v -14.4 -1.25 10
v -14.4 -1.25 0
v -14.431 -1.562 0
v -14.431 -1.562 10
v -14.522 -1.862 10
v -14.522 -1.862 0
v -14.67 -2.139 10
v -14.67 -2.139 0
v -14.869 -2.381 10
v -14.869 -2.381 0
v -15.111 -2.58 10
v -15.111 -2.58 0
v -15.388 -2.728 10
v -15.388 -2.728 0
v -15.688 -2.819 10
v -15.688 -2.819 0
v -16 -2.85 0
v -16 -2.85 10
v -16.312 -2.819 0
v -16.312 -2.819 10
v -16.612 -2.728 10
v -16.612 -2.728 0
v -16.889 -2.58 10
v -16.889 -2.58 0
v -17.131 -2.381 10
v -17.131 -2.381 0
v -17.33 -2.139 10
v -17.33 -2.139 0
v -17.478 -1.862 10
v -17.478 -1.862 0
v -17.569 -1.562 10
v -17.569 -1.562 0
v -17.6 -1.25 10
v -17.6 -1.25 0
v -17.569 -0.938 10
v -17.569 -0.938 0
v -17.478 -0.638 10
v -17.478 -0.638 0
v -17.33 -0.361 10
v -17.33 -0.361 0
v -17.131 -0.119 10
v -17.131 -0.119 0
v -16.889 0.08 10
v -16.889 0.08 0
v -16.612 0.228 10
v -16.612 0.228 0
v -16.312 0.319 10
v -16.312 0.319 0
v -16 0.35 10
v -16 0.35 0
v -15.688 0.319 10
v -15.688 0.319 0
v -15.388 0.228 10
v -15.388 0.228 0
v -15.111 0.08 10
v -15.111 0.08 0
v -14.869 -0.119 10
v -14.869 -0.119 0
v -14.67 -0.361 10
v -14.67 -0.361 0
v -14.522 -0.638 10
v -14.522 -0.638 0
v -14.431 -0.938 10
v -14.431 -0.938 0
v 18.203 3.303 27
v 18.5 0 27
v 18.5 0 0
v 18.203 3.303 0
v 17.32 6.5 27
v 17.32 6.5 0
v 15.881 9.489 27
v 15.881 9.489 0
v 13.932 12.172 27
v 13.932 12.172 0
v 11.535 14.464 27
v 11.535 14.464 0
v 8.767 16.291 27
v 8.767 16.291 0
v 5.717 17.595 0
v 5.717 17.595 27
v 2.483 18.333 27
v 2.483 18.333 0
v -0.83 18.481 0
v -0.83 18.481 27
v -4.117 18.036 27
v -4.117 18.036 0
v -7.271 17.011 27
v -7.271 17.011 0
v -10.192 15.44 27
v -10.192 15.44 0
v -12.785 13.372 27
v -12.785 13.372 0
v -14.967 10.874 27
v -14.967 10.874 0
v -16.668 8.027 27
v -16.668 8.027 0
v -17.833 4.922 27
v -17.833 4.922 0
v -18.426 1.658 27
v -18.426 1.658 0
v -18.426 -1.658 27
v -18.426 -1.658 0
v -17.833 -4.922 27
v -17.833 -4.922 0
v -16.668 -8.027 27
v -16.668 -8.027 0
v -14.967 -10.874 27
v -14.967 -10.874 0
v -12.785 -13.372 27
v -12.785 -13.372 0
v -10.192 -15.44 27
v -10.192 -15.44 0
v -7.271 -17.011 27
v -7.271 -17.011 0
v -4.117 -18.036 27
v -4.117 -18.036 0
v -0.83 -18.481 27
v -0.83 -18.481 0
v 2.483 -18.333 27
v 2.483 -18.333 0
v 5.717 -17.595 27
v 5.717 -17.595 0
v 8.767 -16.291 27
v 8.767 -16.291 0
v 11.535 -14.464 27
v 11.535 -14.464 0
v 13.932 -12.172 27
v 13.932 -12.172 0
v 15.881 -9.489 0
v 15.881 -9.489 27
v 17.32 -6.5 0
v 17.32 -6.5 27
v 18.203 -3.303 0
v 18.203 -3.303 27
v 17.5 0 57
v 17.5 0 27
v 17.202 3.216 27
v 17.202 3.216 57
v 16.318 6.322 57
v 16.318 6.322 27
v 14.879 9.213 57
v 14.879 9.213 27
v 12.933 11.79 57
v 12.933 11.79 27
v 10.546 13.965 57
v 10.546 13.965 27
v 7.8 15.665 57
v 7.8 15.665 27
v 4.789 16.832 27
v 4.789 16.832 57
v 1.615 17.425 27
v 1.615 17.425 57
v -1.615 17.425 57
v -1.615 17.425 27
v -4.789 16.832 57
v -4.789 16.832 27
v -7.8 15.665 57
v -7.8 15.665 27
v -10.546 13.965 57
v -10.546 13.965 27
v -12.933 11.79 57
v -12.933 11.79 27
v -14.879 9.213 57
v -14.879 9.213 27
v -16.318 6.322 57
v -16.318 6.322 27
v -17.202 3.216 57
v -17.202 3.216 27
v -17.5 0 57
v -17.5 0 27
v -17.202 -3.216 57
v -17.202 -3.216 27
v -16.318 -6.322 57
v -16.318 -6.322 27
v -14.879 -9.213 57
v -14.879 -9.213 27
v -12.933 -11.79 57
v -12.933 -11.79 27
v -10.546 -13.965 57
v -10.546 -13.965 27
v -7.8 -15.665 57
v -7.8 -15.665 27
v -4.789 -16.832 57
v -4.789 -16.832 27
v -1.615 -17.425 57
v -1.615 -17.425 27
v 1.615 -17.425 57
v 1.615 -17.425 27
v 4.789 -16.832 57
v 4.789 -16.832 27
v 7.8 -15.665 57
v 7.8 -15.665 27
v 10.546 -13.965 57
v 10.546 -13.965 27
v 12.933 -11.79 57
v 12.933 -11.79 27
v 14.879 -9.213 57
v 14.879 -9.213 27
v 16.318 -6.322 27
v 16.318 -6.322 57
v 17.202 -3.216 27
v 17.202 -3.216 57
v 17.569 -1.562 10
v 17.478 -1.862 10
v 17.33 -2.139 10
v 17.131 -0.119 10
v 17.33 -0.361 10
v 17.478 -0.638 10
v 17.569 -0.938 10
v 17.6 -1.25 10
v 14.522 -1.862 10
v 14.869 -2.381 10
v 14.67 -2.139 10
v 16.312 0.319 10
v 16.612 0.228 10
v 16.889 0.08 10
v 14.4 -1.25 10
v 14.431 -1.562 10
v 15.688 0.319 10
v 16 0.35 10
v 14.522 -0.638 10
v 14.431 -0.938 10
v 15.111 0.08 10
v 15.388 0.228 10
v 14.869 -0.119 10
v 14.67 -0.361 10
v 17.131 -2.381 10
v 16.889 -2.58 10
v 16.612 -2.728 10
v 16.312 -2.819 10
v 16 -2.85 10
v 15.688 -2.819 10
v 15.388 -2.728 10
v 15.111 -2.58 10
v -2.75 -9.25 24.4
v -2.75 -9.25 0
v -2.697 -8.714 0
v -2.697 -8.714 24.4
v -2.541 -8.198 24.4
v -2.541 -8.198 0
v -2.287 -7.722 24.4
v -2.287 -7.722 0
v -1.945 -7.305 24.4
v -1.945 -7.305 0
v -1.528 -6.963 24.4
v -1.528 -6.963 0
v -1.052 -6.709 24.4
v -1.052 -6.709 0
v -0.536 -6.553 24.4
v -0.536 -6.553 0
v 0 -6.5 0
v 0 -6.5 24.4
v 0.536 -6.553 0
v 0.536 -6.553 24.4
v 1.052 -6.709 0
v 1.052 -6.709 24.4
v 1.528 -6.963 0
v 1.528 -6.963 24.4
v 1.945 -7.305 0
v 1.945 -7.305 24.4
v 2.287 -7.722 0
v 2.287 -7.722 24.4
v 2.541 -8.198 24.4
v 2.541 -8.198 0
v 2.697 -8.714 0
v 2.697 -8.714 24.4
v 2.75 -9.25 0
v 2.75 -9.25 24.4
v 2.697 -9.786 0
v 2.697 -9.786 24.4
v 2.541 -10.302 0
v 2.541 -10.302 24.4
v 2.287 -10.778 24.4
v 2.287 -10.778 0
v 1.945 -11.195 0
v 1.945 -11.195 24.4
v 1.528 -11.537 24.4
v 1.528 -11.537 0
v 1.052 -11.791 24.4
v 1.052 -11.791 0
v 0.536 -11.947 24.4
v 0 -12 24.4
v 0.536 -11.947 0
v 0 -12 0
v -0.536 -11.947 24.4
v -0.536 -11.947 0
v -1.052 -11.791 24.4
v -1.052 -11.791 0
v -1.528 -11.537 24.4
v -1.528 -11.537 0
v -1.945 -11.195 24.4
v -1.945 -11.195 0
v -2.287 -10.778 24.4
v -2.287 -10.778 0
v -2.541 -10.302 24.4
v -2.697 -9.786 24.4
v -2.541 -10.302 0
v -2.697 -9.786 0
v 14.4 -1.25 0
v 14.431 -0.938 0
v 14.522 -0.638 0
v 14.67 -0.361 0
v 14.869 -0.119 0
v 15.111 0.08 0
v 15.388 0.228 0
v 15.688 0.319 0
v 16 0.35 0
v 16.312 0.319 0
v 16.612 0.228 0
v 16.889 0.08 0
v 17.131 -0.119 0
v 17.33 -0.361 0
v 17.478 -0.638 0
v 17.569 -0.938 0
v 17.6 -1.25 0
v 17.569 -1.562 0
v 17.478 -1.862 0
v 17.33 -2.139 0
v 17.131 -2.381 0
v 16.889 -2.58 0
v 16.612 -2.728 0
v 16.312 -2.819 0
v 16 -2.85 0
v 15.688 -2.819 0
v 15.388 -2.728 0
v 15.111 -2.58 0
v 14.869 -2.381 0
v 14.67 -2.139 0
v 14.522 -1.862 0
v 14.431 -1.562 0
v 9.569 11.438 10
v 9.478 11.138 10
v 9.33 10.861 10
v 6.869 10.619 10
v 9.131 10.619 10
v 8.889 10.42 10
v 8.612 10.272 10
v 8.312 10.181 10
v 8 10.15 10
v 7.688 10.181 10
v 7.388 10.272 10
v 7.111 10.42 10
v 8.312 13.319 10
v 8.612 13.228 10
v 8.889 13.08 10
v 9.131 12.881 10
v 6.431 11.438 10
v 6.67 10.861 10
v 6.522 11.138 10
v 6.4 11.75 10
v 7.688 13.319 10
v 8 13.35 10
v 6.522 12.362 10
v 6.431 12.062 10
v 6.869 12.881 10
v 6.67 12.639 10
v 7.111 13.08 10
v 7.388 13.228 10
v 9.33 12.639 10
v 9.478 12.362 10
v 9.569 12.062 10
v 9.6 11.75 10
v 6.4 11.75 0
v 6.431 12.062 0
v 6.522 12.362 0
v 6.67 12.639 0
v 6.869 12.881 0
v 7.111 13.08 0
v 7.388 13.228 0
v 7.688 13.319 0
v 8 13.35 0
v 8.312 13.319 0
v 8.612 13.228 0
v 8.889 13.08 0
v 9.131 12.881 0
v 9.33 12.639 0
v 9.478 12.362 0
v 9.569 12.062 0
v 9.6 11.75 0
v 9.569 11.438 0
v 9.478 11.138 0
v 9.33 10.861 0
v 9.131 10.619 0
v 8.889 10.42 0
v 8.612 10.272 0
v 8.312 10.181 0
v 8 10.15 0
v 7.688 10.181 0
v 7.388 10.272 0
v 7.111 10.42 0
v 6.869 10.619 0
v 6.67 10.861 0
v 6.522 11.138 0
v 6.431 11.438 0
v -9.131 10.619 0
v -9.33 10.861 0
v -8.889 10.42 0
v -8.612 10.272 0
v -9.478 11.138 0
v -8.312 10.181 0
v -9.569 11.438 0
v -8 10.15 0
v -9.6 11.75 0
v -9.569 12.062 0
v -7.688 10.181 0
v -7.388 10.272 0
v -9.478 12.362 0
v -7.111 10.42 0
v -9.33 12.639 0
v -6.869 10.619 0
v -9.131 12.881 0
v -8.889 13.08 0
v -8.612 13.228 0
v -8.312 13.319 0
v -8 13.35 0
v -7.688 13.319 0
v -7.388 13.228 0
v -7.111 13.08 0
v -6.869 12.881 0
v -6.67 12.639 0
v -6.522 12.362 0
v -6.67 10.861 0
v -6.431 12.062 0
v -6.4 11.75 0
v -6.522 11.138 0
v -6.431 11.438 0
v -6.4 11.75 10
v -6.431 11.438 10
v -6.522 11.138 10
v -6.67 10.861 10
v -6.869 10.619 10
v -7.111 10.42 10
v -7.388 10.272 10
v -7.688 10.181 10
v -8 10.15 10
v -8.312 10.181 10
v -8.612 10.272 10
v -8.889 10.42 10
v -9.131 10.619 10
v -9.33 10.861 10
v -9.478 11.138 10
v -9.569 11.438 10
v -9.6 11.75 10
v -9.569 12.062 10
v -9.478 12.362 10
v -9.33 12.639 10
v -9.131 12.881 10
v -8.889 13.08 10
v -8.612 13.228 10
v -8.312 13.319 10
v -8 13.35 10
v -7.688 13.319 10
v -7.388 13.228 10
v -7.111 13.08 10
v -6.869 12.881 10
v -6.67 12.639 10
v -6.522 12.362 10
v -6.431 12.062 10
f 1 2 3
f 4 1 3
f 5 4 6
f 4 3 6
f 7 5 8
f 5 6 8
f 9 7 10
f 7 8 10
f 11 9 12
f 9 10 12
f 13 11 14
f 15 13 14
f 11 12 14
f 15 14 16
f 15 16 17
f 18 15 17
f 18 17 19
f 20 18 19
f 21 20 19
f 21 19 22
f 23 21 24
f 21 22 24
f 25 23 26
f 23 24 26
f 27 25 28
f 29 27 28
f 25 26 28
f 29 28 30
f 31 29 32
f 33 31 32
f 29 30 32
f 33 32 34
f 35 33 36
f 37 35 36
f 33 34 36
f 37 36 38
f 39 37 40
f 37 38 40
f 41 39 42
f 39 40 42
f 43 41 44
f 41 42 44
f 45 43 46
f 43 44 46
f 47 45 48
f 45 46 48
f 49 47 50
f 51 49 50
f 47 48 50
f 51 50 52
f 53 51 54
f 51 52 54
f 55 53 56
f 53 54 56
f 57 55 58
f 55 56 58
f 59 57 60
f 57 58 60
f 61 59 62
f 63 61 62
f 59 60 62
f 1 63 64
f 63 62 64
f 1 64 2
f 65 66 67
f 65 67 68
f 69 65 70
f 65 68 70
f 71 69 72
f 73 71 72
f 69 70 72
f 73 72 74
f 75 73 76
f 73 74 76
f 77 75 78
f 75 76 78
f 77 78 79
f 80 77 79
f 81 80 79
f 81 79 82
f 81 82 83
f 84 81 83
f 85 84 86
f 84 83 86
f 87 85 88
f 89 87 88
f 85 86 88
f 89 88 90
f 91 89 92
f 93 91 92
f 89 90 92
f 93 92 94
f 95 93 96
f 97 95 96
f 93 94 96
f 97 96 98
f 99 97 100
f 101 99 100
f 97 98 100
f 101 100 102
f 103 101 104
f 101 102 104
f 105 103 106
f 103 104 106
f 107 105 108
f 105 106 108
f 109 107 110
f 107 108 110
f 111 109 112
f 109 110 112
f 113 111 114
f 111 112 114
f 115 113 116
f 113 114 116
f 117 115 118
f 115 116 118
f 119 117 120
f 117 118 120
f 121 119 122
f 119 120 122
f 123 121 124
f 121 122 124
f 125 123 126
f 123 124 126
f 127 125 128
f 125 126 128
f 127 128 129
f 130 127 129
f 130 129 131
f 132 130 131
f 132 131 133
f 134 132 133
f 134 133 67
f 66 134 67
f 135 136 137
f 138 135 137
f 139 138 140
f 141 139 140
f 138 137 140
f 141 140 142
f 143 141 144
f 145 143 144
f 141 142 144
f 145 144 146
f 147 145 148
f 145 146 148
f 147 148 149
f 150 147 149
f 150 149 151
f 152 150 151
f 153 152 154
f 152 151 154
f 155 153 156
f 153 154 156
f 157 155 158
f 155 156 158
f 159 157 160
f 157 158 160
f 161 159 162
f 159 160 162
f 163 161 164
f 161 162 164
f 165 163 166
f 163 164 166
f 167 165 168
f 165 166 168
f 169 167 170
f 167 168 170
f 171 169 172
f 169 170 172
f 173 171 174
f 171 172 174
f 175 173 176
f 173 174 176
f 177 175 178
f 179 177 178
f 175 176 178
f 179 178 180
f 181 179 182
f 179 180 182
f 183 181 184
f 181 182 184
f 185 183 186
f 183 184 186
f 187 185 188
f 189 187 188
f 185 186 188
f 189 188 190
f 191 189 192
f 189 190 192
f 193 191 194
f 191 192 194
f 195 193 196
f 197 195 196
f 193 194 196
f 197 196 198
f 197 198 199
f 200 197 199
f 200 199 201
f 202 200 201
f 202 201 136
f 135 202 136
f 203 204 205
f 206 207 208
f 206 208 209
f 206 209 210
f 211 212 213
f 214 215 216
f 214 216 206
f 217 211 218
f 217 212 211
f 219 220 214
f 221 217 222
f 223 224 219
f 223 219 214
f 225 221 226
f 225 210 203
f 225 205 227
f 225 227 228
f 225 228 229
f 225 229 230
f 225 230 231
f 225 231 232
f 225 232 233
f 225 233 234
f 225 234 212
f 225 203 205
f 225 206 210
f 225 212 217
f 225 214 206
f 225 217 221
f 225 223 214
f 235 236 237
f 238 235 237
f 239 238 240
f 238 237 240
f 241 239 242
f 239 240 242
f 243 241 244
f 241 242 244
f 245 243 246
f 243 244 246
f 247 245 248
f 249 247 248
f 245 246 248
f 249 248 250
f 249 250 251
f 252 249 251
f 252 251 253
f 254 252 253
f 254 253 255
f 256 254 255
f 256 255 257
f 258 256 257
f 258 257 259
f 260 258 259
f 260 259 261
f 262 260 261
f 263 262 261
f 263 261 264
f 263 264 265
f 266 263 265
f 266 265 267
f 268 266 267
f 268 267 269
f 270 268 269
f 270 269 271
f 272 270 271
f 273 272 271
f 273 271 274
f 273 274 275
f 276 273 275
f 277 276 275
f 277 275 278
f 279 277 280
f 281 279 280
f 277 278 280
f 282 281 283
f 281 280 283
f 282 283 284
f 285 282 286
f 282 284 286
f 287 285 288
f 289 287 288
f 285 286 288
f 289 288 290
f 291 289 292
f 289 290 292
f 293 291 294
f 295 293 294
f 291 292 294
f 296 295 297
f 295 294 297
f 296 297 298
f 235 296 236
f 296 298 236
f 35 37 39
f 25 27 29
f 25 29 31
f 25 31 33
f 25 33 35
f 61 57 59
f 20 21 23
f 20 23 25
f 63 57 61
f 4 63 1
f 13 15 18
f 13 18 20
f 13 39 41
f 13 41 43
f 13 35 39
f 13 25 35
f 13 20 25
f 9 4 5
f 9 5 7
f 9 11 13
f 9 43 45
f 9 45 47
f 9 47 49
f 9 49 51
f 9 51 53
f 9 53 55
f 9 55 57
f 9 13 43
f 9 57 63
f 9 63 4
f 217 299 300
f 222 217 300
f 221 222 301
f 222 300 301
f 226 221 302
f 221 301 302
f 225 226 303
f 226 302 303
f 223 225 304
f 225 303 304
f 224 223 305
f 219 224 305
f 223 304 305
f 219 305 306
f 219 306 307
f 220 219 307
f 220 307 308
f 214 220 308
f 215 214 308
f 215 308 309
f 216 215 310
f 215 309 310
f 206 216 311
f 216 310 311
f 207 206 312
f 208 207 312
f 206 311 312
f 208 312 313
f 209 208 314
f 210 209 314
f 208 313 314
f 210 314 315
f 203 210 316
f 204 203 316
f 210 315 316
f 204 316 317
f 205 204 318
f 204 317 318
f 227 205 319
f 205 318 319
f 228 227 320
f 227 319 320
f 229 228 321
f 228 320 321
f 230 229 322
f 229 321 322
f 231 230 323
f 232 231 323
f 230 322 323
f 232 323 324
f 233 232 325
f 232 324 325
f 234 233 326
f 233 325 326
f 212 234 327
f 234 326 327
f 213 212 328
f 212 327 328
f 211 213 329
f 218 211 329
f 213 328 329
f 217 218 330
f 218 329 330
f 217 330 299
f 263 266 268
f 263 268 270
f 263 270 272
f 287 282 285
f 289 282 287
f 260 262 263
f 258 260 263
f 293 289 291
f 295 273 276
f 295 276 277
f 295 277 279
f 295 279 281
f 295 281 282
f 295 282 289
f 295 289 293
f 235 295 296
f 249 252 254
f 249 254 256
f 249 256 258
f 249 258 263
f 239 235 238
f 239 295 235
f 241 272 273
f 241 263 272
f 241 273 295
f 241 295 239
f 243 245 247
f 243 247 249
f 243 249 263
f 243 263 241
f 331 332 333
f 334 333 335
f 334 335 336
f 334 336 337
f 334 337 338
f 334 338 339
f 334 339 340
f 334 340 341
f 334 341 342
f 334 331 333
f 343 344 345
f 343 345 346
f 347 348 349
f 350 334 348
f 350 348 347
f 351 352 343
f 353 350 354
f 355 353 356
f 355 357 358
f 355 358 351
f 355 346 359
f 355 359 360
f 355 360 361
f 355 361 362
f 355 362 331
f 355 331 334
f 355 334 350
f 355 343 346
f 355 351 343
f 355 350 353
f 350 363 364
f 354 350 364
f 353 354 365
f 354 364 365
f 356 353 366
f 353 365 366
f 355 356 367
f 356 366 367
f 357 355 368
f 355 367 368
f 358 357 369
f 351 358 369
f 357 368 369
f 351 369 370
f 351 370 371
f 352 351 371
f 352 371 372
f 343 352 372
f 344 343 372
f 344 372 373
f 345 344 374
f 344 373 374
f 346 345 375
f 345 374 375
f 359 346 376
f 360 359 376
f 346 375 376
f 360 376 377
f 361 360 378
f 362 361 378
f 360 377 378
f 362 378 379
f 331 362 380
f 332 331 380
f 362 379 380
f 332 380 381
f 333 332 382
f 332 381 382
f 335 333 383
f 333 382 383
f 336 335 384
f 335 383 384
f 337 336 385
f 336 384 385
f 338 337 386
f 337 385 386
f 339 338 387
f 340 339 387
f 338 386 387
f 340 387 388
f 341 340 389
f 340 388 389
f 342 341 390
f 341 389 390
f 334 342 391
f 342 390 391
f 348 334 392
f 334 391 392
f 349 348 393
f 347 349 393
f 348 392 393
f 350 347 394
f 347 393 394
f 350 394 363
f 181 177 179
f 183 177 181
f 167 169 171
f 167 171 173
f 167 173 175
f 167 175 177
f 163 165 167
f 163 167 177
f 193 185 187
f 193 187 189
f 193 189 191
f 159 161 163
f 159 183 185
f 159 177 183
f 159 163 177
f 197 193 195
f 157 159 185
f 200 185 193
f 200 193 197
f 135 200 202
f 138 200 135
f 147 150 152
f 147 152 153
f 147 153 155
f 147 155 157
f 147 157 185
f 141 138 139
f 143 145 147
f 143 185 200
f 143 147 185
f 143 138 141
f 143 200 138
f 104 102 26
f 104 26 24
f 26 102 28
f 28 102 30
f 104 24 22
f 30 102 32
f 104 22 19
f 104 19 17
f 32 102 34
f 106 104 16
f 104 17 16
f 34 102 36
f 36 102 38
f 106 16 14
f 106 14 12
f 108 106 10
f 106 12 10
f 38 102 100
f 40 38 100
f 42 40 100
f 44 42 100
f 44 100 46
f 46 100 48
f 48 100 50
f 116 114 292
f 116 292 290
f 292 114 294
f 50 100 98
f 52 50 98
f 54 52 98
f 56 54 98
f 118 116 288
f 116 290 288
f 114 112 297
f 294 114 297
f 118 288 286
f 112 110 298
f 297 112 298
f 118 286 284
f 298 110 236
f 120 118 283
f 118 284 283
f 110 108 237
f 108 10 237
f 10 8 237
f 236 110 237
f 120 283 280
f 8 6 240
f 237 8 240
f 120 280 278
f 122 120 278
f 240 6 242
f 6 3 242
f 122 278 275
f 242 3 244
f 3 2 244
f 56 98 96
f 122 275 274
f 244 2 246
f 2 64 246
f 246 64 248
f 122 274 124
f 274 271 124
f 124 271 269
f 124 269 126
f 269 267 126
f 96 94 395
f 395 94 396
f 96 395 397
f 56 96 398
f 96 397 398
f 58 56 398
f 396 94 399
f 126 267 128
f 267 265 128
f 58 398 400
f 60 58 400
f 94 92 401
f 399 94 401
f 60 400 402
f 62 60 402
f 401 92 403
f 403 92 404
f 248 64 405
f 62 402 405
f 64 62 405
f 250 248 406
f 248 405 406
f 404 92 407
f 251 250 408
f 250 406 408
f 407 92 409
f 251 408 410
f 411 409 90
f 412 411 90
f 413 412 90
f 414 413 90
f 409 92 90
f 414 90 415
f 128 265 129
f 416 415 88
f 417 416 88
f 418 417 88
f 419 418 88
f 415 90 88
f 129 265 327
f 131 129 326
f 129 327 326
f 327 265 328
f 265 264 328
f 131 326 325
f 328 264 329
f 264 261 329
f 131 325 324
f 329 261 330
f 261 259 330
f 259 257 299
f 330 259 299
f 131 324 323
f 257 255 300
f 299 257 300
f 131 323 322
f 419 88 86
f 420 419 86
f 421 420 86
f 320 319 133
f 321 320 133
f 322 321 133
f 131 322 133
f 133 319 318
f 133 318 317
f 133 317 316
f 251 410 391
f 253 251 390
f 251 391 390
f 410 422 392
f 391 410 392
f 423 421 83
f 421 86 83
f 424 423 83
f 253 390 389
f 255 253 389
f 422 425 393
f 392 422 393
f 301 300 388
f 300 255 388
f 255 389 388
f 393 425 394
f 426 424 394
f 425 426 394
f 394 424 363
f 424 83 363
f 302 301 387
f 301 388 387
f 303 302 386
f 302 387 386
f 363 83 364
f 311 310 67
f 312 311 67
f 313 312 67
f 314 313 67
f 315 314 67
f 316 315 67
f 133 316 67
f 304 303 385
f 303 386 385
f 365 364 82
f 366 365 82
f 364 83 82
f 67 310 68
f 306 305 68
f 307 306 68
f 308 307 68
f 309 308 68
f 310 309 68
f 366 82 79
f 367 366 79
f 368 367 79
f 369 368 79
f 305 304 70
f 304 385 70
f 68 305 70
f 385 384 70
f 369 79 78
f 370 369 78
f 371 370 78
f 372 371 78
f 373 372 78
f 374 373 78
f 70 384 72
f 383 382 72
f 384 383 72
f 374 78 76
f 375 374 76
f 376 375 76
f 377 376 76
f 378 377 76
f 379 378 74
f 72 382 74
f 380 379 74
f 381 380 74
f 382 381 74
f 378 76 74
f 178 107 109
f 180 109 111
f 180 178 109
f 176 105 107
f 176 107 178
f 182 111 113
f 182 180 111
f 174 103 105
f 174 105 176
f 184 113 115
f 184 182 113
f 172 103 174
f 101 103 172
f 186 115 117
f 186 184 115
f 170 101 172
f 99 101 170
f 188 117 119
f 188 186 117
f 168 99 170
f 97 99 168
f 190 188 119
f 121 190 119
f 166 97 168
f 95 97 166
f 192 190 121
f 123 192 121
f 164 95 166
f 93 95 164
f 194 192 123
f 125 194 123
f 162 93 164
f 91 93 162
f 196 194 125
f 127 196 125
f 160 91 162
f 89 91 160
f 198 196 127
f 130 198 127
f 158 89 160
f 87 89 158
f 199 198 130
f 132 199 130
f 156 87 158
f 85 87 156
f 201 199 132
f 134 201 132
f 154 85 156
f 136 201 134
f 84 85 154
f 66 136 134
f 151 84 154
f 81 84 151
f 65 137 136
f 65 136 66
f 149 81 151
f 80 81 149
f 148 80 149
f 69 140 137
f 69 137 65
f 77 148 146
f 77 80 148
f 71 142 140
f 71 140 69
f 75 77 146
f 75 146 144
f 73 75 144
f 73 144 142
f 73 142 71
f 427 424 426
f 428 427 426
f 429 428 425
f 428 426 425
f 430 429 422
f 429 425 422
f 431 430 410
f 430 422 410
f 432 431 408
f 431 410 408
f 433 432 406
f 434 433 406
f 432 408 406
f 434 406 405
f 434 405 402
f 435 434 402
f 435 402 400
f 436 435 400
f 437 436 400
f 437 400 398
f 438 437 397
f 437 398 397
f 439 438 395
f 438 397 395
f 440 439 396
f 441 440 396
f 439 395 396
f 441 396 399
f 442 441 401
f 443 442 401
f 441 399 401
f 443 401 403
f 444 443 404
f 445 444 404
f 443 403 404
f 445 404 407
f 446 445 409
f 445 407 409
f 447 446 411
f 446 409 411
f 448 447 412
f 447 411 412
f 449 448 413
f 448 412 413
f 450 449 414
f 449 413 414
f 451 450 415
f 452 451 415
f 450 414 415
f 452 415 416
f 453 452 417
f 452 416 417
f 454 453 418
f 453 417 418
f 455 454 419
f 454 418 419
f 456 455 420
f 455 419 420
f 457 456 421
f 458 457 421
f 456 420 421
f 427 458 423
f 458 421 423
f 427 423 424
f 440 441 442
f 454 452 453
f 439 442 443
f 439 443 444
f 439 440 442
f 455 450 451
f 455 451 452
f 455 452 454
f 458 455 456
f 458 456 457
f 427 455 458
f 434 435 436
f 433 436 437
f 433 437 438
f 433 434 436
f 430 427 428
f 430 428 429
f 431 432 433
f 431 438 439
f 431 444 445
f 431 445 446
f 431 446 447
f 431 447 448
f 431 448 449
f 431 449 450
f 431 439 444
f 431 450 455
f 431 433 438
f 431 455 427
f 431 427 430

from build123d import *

# Parameters (mm, degrees)
SKETCH_1_R          = 18.5
EXTRUDE_1_DEPTH     = 27
SKETCH_2_R          = 17.5
EXTRUDE_2_DEPTH     = 30
SKETCH_3_R          = 2.75
CUT_EXTRUDE_1_DEPTH = 24.4
SKETCH_4_R          = 1.6
SKETCH_4_R_2        = 2.75
CUT_EXTRUDE_2_DEPTH = 10


with BuildPart() as part:
    # 草图1 → 凸台-拉伸1 (new body)
    with BuildSketch(Plane.XY):
        Circle(SKETCH_1_R)
    extrude(amount=EXTRUDE_1_DEPTH)

    # 草图2 → 凸台-拉伸2 (add)
    with BuildSketch(Plane.XY.offset(27)):
        Circle(SKETCH_2_R)
    extrude(amount=EXTRUDE_2_DEPTH)

    # 草图3 → 切除-拉伸1 (cut)
    with BuildSketch(Plane(origin=(0, 0, 0), x_dir=(-1, 0, 0), z_dir=(0, 0, -1))):
        with Locations((0, -9.25)):
            Circle(SKETCH_3_R)
    extrude(amount=-CUT_EXTRUDE_1_DEPTH, mode=Mode.SUBTRACT)

    # 草图4 → 切除-拉伸2 (cut)
    with BuildSketch(Plane(origin=(0, 0, 0), x_dir=(-1, 0, 0), z_dir=(0, 0, -1))):
        with Locations((-16, -1.25)):
            Circle(SKETCH_4_R)
        with Locations((-8, 11.75)):
            Circle(SKETCH_4_R)
        with Locations((0, -9.25)):
            Circle(SKETCH_4_R_2)
        with Locations(Location((16, -1.25, 0), (0, 0, 180))):
            Circle(SKETCH_4_R)
        with Locations(Location((8, 11.75, 0), (0, 0, 180))):
            Circle(SKETCH_4_R)
    extrude(amount=-CUT_EXTRUDE_2_DEPTH, mode=Mode.SUBTRACT)


solid = part.part
